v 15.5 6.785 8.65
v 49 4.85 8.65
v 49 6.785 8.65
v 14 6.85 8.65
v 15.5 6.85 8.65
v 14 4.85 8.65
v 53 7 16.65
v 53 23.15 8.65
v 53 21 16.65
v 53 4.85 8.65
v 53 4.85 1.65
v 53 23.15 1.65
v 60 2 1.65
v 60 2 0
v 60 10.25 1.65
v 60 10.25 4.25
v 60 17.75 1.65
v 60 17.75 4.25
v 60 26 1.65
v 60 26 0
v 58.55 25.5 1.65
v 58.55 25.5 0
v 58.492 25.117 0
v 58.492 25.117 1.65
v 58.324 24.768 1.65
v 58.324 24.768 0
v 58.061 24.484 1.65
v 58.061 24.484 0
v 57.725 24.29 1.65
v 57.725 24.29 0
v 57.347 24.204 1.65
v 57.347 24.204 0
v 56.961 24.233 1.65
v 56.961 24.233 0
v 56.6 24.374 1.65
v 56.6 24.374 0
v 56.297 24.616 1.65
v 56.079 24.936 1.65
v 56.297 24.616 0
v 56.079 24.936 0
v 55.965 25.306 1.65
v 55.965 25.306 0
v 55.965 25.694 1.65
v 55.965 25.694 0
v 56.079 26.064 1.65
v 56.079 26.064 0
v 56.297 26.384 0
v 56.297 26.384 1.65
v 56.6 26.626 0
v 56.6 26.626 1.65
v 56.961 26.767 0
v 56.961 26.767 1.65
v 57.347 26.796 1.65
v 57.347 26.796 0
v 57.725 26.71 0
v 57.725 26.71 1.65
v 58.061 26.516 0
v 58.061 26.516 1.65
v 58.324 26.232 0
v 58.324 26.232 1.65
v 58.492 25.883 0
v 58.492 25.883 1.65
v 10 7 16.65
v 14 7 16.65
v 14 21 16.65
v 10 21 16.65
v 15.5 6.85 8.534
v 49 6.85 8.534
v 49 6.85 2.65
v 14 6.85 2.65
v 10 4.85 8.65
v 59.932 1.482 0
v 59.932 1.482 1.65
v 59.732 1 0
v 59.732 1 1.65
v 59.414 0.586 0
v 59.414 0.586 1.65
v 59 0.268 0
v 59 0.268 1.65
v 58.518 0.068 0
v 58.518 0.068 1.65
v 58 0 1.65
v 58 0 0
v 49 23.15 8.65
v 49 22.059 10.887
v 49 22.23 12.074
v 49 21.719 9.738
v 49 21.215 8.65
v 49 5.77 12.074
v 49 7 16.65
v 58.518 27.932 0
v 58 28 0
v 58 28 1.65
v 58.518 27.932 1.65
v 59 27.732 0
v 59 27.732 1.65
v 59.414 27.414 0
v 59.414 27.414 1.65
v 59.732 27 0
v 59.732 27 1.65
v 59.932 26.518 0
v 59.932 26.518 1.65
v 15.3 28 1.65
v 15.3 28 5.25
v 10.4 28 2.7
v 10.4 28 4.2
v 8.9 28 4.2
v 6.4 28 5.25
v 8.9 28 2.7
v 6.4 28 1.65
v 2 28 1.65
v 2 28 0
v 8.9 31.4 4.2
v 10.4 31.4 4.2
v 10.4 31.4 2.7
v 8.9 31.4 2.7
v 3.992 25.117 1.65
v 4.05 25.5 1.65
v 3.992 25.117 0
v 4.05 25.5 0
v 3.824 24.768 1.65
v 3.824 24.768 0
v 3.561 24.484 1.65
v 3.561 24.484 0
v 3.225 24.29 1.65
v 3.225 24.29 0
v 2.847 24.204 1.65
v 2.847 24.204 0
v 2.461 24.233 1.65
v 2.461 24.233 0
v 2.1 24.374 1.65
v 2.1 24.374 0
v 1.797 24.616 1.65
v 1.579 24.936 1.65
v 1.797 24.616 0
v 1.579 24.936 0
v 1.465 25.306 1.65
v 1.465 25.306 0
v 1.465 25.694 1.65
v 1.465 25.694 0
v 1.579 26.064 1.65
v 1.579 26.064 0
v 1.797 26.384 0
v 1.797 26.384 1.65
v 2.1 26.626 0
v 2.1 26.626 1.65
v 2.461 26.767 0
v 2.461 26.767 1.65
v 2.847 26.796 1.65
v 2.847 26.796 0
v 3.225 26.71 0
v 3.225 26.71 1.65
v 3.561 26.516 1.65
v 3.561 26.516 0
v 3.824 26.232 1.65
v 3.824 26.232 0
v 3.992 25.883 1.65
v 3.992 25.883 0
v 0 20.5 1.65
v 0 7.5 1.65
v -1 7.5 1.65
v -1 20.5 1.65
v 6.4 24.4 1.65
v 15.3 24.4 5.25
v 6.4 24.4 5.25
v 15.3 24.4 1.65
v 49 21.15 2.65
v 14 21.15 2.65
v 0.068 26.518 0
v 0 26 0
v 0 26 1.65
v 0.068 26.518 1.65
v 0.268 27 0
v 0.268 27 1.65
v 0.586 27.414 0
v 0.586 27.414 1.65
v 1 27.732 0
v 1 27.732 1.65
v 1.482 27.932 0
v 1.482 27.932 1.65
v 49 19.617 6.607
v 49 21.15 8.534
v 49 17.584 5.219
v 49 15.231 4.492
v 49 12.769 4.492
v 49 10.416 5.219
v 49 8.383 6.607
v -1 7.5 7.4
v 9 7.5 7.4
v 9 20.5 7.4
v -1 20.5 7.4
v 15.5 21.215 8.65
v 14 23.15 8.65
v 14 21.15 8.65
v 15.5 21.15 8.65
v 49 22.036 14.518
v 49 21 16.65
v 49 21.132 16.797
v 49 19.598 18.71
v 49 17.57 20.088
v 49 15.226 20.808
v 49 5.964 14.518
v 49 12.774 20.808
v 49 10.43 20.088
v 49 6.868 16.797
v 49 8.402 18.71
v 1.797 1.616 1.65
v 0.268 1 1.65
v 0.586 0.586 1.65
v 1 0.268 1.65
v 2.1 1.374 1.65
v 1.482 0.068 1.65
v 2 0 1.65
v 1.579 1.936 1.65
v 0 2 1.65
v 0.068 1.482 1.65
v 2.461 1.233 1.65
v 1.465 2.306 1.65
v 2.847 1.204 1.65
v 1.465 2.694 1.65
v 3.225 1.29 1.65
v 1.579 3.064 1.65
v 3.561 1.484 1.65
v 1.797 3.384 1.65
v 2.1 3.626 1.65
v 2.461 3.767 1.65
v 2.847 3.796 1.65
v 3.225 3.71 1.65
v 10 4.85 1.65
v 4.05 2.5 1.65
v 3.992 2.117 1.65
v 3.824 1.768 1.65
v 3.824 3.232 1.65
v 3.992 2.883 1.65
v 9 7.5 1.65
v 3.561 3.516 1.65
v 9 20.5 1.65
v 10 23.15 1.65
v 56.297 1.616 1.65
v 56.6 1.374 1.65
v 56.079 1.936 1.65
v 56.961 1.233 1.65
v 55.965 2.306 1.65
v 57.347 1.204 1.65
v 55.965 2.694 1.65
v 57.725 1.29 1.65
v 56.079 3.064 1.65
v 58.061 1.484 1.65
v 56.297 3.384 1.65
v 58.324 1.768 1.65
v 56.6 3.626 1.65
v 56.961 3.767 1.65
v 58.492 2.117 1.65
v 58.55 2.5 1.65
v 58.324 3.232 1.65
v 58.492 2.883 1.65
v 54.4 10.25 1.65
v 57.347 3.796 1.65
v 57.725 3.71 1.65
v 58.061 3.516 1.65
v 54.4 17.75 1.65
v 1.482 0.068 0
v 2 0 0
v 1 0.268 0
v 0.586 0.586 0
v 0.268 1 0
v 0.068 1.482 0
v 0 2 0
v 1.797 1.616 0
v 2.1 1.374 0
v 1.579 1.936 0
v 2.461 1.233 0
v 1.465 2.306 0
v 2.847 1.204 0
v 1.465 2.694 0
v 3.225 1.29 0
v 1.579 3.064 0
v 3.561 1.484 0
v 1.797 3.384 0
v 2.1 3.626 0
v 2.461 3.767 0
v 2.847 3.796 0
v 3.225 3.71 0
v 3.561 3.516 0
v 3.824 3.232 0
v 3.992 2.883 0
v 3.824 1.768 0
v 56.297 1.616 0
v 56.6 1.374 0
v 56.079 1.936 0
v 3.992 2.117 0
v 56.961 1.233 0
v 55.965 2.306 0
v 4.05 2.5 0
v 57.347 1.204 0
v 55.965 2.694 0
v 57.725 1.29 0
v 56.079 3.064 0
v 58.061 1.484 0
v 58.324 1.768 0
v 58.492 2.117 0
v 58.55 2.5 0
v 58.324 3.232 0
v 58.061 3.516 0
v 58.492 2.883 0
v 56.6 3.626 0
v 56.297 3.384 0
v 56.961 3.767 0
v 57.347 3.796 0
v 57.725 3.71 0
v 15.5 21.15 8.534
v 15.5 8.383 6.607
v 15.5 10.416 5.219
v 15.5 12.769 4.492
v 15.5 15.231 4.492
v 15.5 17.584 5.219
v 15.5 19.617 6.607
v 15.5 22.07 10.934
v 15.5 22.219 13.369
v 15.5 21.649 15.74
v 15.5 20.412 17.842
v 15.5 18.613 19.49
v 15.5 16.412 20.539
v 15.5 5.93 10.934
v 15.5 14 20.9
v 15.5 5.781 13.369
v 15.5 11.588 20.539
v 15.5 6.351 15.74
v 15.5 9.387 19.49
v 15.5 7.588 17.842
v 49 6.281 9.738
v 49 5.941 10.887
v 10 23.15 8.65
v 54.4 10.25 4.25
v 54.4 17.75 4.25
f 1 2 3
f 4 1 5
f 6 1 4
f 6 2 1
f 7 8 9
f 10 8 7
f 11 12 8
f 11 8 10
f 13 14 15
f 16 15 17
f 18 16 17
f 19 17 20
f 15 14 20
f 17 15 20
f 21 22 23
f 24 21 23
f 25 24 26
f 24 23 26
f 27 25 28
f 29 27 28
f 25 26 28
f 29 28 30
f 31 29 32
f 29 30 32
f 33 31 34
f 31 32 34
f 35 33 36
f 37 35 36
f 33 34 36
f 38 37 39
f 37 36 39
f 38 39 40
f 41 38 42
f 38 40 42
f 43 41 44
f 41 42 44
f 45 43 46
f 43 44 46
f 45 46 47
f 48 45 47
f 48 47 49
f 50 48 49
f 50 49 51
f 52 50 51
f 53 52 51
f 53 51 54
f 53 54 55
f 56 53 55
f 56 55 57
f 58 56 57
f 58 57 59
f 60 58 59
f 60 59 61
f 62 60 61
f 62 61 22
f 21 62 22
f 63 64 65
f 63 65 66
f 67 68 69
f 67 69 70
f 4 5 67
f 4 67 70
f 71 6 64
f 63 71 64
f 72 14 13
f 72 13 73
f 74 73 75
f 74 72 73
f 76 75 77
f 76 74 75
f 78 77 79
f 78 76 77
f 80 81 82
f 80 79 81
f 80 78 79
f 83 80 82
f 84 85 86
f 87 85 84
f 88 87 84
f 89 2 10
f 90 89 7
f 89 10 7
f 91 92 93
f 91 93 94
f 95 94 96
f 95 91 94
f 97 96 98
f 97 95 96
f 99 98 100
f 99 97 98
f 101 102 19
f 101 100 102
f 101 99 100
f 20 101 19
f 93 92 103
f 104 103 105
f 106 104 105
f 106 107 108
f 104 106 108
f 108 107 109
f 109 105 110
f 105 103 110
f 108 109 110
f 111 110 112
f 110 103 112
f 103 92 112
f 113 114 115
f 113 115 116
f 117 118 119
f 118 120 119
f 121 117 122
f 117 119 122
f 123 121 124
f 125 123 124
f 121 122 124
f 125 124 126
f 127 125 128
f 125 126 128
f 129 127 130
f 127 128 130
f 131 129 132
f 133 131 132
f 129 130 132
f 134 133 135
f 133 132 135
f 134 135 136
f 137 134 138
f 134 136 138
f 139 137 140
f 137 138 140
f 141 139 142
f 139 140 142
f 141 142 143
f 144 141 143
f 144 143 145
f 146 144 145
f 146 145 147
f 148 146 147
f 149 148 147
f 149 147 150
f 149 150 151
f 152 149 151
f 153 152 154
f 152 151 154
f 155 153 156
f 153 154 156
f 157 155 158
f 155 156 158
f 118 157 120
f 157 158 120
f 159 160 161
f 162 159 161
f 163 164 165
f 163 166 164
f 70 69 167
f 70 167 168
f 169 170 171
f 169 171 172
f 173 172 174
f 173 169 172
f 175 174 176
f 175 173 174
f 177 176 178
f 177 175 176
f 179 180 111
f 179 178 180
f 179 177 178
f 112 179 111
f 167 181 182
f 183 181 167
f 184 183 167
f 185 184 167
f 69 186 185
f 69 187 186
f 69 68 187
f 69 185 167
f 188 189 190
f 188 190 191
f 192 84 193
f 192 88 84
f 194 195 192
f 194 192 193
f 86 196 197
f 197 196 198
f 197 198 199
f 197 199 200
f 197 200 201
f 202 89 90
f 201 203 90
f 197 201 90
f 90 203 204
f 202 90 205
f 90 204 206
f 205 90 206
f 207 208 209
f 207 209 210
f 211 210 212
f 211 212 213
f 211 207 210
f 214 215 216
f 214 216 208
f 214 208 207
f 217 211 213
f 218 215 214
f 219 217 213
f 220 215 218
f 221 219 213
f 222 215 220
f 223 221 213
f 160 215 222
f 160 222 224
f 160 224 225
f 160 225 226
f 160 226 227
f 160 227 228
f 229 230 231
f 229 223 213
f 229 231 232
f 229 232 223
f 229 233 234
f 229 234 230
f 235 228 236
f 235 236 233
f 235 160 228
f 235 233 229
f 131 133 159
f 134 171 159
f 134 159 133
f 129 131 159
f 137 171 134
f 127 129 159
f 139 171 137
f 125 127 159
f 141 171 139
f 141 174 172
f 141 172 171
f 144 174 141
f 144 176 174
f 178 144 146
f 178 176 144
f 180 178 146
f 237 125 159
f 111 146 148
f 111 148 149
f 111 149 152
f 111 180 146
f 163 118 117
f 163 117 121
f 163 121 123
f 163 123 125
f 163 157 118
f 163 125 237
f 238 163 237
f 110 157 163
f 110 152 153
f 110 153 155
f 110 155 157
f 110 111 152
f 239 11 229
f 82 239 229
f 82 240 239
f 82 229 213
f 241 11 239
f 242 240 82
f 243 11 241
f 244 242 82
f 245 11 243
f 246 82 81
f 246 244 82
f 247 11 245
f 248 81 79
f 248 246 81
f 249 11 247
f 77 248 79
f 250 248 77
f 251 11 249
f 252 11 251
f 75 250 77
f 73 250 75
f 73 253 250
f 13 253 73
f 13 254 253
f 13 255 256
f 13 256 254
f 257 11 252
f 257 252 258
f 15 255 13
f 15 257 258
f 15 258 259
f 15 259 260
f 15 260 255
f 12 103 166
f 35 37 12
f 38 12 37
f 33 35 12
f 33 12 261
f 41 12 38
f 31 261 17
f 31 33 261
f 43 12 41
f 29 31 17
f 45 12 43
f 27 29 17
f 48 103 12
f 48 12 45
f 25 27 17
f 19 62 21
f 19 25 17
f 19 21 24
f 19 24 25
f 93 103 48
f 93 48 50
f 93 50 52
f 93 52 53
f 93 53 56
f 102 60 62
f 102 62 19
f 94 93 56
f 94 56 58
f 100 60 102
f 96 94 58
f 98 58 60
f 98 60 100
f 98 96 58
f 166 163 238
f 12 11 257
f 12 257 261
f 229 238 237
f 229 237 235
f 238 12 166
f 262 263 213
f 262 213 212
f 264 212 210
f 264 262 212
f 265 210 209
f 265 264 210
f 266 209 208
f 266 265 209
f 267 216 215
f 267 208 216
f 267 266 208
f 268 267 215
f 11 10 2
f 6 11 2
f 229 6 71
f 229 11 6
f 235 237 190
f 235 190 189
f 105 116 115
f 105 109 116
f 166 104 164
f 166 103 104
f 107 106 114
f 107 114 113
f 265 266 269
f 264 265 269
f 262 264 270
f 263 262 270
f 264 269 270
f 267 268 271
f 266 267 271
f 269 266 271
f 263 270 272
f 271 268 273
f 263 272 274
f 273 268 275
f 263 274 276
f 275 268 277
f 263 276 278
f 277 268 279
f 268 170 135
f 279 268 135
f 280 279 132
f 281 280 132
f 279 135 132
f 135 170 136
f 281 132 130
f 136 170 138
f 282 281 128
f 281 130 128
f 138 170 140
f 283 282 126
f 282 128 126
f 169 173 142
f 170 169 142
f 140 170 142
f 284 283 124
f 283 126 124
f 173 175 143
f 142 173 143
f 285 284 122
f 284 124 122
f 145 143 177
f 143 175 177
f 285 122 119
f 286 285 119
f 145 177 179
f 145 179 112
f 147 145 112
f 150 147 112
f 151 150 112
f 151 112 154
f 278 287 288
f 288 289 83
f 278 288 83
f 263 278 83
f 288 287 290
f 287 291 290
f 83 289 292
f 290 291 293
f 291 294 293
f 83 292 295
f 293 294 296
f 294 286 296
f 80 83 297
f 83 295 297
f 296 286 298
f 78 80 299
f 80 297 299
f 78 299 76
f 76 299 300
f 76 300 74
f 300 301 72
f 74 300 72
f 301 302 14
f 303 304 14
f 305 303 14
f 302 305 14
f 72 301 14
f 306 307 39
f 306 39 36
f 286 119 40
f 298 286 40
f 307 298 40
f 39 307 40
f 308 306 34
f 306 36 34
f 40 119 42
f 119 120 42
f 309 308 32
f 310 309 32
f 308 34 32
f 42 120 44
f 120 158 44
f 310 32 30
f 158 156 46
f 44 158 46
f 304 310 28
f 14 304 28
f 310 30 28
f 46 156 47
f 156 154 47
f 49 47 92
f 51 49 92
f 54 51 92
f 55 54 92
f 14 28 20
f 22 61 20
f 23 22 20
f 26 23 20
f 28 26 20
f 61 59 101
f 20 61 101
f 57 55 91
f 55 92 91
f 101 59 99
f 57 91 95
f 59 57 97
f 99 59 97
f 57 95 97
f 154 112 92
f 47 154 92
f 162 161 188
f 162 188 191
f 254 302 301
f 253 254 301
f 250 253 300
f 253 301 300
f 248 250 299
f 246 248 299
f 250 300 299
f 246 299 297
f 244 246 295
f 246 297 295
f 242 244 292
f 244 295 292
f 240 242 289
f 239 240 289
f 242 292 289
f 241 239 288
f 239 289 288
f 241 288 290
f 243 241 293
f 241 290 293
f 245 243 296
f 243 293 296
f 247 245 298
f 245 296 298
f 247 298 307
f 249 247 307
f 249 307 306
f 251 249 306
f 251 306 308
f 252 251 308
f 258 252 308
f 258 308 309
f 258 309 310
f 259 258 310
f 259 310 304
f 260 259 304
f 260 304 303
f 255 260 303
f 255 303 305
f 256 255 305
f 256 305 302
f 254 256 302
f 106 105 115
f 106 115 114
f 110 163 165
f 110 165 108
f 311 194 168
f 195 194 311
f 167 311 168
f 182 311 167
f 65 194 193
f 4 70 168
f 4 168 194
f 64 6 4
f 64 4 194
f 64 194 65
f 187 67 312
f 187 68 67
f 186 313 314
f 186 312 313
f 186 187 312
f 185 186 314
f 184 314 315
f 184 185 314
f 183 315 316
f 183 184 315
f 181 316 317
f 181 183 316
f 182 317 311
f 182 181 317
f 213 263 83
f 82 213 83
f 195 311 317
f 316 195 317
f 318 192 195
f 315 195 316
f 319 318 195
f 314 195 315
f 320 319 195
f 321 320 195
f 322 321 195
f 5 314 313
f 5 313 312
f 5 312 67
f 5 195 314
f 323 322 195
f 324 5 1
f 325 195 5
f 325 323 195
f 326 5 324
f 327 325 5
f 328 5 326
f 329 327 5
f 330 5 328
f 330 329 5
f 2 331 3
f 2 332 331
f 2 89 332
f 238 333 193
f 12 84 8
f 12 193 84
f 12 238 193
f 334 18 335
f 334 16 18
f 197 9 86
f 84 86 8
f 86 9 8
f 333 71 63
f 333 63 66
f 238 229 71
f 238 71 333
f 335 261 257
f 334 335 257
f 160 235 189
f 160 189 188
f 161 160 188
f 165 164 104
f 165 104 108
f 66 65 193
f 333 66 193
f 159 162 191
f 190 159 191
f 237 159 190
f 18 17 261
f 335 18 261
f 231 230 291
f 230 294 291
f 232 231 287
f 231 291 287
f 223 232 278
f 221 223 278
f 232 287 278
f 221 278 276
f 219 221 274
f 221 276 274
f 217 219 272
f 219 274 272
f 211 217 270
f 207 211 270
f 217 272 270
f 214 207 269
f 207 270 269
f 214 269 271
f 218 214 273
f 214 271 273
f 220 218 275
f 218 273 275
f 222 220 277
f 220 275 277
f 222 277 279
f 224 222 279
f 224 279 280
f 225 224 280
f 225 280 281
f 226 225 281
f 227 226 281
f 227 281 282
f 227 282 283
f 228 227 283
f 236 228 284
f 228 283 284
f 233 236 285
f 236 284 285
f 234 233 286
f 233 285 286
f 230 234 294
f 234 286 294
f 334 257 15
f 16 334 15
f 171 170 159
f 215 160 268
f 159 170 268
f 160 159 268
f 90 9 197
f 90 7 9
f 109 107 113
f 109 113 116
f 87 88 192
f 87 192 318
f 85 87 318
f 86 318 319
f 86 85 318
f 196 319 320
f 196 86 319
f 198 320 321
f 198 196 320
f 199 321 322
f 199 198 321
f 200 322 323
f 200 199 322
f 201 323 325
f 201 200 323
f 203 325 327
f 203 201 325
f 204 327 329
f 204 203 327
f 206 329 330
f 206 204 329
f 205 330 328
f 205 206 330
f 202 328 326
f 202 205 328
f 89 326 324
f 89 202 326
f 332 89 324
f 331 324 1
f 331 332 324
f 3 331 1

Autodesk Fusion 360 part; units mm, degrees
sketch "Sketch1" plane through (0, 0, 0) normal (0, 0, 1) x (1, 0, 0)
  line L0 (2, 0) -> (58, 0)
  line L1 (60, 2) -> (60, 26)
  line L2 (58, 28) -> (2, 28)
  line L3 (0, 26) -> (0, 2)
  arc A0 (2, 28) -> (0, 26) centre (2, 26) ccw
  arc A1 (60, 26) -> (58, 28) centre (58, 26) ccw
  arc A2 (58, 0) -> (60, 2) centre (58, 2) ccw
  arc A3 (0, 2) -> (2, 0) centre (2, 2) ccw
  point P0 (60, 0)
  point P1 (0, 28)
  dimension "d56" = 60
  dimension "d57" = 28
  dimension "d58" = 2
extrude "Extrude1" add sketch "Sketch1" along normal blind 1.65
sketch "Sketch2" plane through (0, 0, 1.65) normal (0, 0, 1) x (-1, 0, 0)
  arc A0 (0, -2) -> (-2, 0) centre (-2, -2) ccw
  line L0 (-2, 0) -> (-58, 0)
  arc A1 (-58, 0) -> (-60, -2) centre (-58, -2) ccw
  line L1 (-60, -2) -> (-60, -26)
  arc A2 (-60, -26) -> (-58, -28) centre (-58, -26) ccw
  line L2 (-58, -28) -> (-2, -28)
  arc A3 (-2, -28) -> (0, -26) centre (-2, -26) ccw
  line L3 (0, -26) -> (0, -2)
  line L4 (1, -20.5) -> (-9, -20.5)
  line L5 (-9, -20.5) -> (-9, -7.5)
  line L6 (-9, -7.5) -> (1, -7.5)
  line L7 (1, -7.5) -> (1, -20.5)
  line L8 (0, -14) -> (-60, -14) construction
  dimension "d61" = 10
  dimension "d62" = 13
  dimension "d63" = 1
extrude "Extrude2" add sketch "Sketch2" along normal blind 5.75 contours L3 L4 L6 L7 | L3 L4 L5 L6
sketch "Sketch3" plane through (0, 0, 1.65) normal (0, 0, 1) x (-1, 0, 0)
  line L0 (-9, -7.5) -> (0, -7.5)
  line L1 (0, -7.5) -> (0, -2)
  arc A0 (0, -2) -> (-2, 0) centre (-2, -2) ccw
  line L2 (-2, 0) -> (-58, 0)
  arc A1 (-58, 0) -> (-60, -2) centre (-58, -2) ccw
  line L3 (-60, -2) -> (-60, -26)
  arc A2 (-60, -26) -> (-58, -28) centre (-58, -26) ccw
  line L4 (-58, -28) -> (-2, -28)
  arc A3 (-2, -28) -> (0, -26) centre (-2, -26) ccw
  line L5 (0, -26) -> (0, -20.5)
  line L6 (0, -20.5) -> (-9, -20.5)
  line L7 (-9, -20.5) -> (-9, -7.5)
  line L8 (-9, -14) -> (-60, -14) construction
  line L9 (-10, -23.15) -> (-53, -23.15)
  line L10 (-53, -23.15) -> (-53, -4.85)
  line L11 (-53, -4.85) -> (-10, -4.85)
  line L12 (-10, -4.85) -> (-10, -23.15)
  dimension "d66" = 43
  dimension "d67" = 18.3
  dimension "d68" = 1
extrude "Extrude3" add sketch "Sketch3" along normal blind 15 contours L9 L10 L11 L12
sketch "Sketch4" plane through (53, 0, 0) normal (1, 0, 0) x (0, 1, 0)
  line L0 (4.85, 1.65) -> (23.15, 1.65)
  line L1 (23.15, 1.65) -> (23.15, 16.65)
  line L2 (23.15, 16.65) -> (4.85, 16.65)
  line L3 (4.85, 16.65) -> (4.85, 1.65)
  line L4 (4.85, 8.65) -> (7.2688, 17.65)
  line L5 (7.2688, 17.65) -> (20.7313, 17.65)
  line L6 (20.7313, 17.65) -> (23.15, 8.65)
  line L7 (4.85, 8.65) -> (23.15, 8.65) construction
  line L8 (7, 16.65) -> (21, 16.65) construction
  line L9 (14, 16.65) -> (14, 1.65) construction
  dimension "d71" = 14
  dimension "d72" = 7
  dimension "d73" = 1
extrude "Extrude4" cut sketch "Sketch4" against normal up to surface (43 mm away) contours L2 L3 L4 | L1 L2 L6
sketch "Sketch5" plane through (0, 4.85, 0) normal (0, -1, 0) x (1, 0, 0)
  line L0 (53, 8.65) -> (10, 8.65)
  line L1 (10, 8.65) -> (10, 1.65)
  line L2 (10, 1.65) -> (53, 1.65)
  line L3 (53, 1.65) -> (53, 8.65)
  line L4 (14, 16.65) -> (49, 16.65)
  line L5 (49, 16.65) -> (49, 8.65)
  line L6 (49, 8.65) -> (14, 8.65)
  line L7 (14, 8.65) -> (14, 16.65)
  line L8 (10, 8.65) -> (10, 16.65)
  line L9 (31.5, 1.65) -> (31.5, 16.653) construction
  line L10 (10, 16.65) -> (53, 16.65) construction
  dimension "d76" = 4
extrude "Extrude5" cut sketch "Sketch5" against normal through all contours L0 L4 L5 L6 L7
sketch "Sketch6" plane through (0, 0, 8.65) normal (0, 0, 1) x (-1, 0, 0)
  line L0 (-49, -23.15) -> (-14, -23.15)
  line L1 (-14, -23.15) -> (-14, -4.85)
  line L2 (-14, -4.85) -> (-49, -4.85)
  line L3 (-49, -4.85) -> (-49, -23.15)
  line L4 (-14, -14) -> (-49, -14) construction
  line L5 (-14, -21.15) -> (-49, -21.15)
  line L6 (-49, -21.15) -> (-49, -6.85)
  line L7 (-49, -6.85) -> (-14, -6.85)
  line L8 (-14, -6.85) -> (-14, -21.15)
  dimension "d78" = 2
extrude "Extrude6" cut sketch "Sketch6" against normal blind 6 contours L1 L3 L5 L6 L7 L8
sketch "Sketch7" plane through (49, 0, 0) normal (-1, 0, 0) x (0, -1, 0)
  line L0 (-4.85, 8.65) -> (-7, 16.65)
  line L1 (-7, 16.65) -> (-21, 16.65)
  line L2 (-21, 16.65) -> (-23.15, 8.65)
  line L3 (-23.15, 8.65) -> (-21.15, 8.65)
  line L4 (-21.15, 8.65) -> (-21.15, 2.65)
  line L5 (-21.15, 2.65) -> (-6.85, 2.65)
  line L6 (-6.85, 2.65) -> (-6.85, 8.65)
  line L7 (-6.85, 8.65) -> (-4.85, 8.65)
  line L8 (-14, 16.65) -> (-14, 2.65) construction
  circle A0 centre (-14, 12.65) radius 8.25
  dimension "d81" = 16.5
  dimension "d82" = 4
extrude "Extrude7" add sketch "Sketch7" along normal blind 33.5 contours L0 L1 L2 L3 L4 L6 L7 A0 | L0 L1 L2 A0
sketch "Sketch8" plane through (0, 0, 1.65) normal (0, 0, 1) x (-1, 0, 0)
  line L0 (-10, -4.85) -> (-10, -23.15)
  line L1 (-10, -23.15) -> (-53, -23.15)
  line L2 (-53, -23.15) -> (-53, -4.85)
  line L3 (-53, -4.85) -> (-10, -4.85)
  line L4 (-9, -7.5) -> (0, -7.5)
  line L5 (0, -7.5) -> (0, -2)
  arc A0 (0, -2) -> (-2, 0) centre (-2, -2) ccw
  line L6 (-2, 0) -> (-58, 0)
  arc A1 (-58, 0) -> (-60, -2) centre (-58, -2) ccw
  line L7 (-60, -2) -> (-60, -26)
  arc A2 (-60, -26) -> (-58, -28) centre (-58, -26) ccw
  line L8 (-58, -28) -> (-2, -28)
  arc A3 (-2, -28) -> (0, -26) centre (-2, -26) ccw
  line L9 (0, -26) -> (0, -20.5)
  line L10 (0, -20.5) -> (-9, -20.5)
  line L11 (-9, -20.5) -> (-9, -7.5)
  line L12 (-60, -14) -> (-9, -14) construction
  line L13 (-60, -17.75) -> (-54.4, -17.75)
  line L14 (-54.4, -17.75) -> (-54.4, -10.25)
  line L15 (-54.4, -10.25) -> (-60, -10.25)
  line L16 (-60, -10.25) -> (-60, -17.75)
  dimension "d85" = 5.6
  dimension "d86" = 7.5
extrude "Extrude8" add sketch "Sketch8" along normal blind 2.6 contours L7 L13 L14 L15 L16
sketch "Sketch9" plane through (0, 0, 0) normal (0, 0, -1) x (1, 0, 0)
  arc A0 (2, 0) -> (0, -2) centre (2, -2) ccw
  line L0 (0, -2) -> (0, -26)
  arc A1 (0, -26) -> (2, -28) centre (2, -26) ccw
  line L1 (2, -28) -> (58, -28)
  arc A2 (58, -28) -> (60, -26) centre (58, -26) ccw
  line L2 (60, -26) -> (60, -2)
  arc A3 (60, -2) -> (58, 0) centre (58, -2) ccw
  line L3 (58, 0) -> (2, 0)
  line L4 (0, -14) -> (60, -14) construction
  line L5 (30, 0) -> (30, -28) construction
  circle A4 centre (2.75, -2.5) radius 1.3
  circle A5 centre (57.25, -2.5) radius 1.3
  circle A6 centre (2.75, -25.5) radius 1.3
  circle A7 centre (57.25, -25.5) radius 1.3
  line L6 (2.75, -2.5) -> (57.25, -2.5) construction
  line L7 (57.25, -2.5) -> (57.25, -25.5) construction
  line L8 (57.25, -25.5) -> (2.75, -25.5) construction
  line L9 (2.75, -25.5) -> (2.75, -2.5) construction
  dimension "d89" = 23
  dimension "d90" = 54.5
  dimension "d91" = 2.6
extrude "Extrude9" cut sketch "Sketch9" against normal up to surface (1.65 mm away) contours A4 | A5 | A6 | A7
sketch "Sketch10" plane through (0, 0, 1.65) normal (0, 0, 1) x (-1, 0, 0)
  circle A0 centre (-57.25, -2.5) radius 1.3
  circle A1 centre (-57.25, -25.5) radius 1.3
  circle A2 centre (-2.75, -2.5) radius 1.3
  circle A3 centre (-2.75, -25.5) radius 1.3
  line L0 (-54.4, -17.75) -> (-60, -17.75)
  line L1 (-60, -17.75) -> (-60, -26)
  arc A4 (-60, -26) -> (-58, -28) centre (-58, -26) ccw
  line L2 (-58, -28) -> (-2, -28)
  arc A5 (-2, -28) -> (0, -26) centre (-2, -26) ccw
  line L3 (0, -26) -> (0, -20.5)
  line L4 (0, -20.5) -> (-9, -20.5)
  line L5 (-9, -20.5) -> (-9, -7.5)
  line L6 (-9, -7.5) -> (0, -7.5)
  line L7 (0, -7.5) -> (0, -2)
  arc A6 (0, -2) -> (-2, 0) centre (-2, -2) ccw
  line L8 (-2, 0) -> (-58, 0)
  arc A7 (-58, 0) -> (-60, -2) centre (-58, -2) ccw
  line L9 (-60, -2) -> (-60, -10.25)
  line L10 (-60, -10.25) -> (-54.4, -10.25)
  line L11 (-54.4, -10.25) -> (-54.4, -17.75)
  line L12 (-10, -4.85) -> (-10, -23.15)
  line L13 (-10, -23.15) -> (-53, -23.15)
  line L14 (-53, -23.15) -> (-53, -4.85)
  line L15 (-53, -4.85) -> (-10, -4.85)
  line L16 (-6.4, -28) -> (-15.3, -28)
  line L17 (-15.3, -28) -> (-15.3, -24.4)
  line L18 (-15.3, -24.4) -> (-6.4, -24.4)
  line L19 (-6.4, -24.4) -> (-6.4, -28)
  dimension "d1" = 8.9
  dimension "d2" = 3.6
  dimension "d3" = 15.3
extrude "Extrude10" add sketch "Sketch10" along normal blind 3.6 contours L2 L16 L17 L18 L19
sketch "Sketch11" plane through (0, 28, 0) normal (0, 1, 0) x (-1, 0, 0)
  line L0 (-58, 0) -> (-2, 0)
  line L1 (-2, 0) -> (-2, 1.65)
  line L2 (-2, 1.65) -> (-6.4, 1.65)
  line L3 (-6.4, 1.65) -> (-6.4, 5.25)
  line L4 (-6.4, 5.25) -> (-15.3, 5.25)
  line L5 (-15.3, 5.25) -> (-15.3, 1.65)
  line L6 (-15.3, 1.65) -> (-58, 1.65)
  line L7 (-58, 1.65) -> (-58, 0)
  line L8 (-15.3, 3.45) -> (-6.4, 3.45) construction
  line L9 (-8.9, 2.7) -> (-10.4, 2.7)
  line L10 (-10.4, 2.7) -> (-10.4, 4.2)
  line L11 (-10.4, 4.2) -> (-8.9, 4.2)
  line L12 (-8.9, 4.2) -> (-8.9, 2.7)
  line L13 (-8.9, 2.7) -> (-10.4, 4.2) construction
  line L14 (-10.4, 2.7) -> (-8.9, 4.2) construction
  point P0 (-9.65, 3.45)
  dimension "d6" = 1.5
  dimension "d7" = 1.5
  dimension "d8" = 2.5
extrude "Extrude11" add sketch "Sketch11" along normal blind 3.4 contours L9 L10 L11 L12
